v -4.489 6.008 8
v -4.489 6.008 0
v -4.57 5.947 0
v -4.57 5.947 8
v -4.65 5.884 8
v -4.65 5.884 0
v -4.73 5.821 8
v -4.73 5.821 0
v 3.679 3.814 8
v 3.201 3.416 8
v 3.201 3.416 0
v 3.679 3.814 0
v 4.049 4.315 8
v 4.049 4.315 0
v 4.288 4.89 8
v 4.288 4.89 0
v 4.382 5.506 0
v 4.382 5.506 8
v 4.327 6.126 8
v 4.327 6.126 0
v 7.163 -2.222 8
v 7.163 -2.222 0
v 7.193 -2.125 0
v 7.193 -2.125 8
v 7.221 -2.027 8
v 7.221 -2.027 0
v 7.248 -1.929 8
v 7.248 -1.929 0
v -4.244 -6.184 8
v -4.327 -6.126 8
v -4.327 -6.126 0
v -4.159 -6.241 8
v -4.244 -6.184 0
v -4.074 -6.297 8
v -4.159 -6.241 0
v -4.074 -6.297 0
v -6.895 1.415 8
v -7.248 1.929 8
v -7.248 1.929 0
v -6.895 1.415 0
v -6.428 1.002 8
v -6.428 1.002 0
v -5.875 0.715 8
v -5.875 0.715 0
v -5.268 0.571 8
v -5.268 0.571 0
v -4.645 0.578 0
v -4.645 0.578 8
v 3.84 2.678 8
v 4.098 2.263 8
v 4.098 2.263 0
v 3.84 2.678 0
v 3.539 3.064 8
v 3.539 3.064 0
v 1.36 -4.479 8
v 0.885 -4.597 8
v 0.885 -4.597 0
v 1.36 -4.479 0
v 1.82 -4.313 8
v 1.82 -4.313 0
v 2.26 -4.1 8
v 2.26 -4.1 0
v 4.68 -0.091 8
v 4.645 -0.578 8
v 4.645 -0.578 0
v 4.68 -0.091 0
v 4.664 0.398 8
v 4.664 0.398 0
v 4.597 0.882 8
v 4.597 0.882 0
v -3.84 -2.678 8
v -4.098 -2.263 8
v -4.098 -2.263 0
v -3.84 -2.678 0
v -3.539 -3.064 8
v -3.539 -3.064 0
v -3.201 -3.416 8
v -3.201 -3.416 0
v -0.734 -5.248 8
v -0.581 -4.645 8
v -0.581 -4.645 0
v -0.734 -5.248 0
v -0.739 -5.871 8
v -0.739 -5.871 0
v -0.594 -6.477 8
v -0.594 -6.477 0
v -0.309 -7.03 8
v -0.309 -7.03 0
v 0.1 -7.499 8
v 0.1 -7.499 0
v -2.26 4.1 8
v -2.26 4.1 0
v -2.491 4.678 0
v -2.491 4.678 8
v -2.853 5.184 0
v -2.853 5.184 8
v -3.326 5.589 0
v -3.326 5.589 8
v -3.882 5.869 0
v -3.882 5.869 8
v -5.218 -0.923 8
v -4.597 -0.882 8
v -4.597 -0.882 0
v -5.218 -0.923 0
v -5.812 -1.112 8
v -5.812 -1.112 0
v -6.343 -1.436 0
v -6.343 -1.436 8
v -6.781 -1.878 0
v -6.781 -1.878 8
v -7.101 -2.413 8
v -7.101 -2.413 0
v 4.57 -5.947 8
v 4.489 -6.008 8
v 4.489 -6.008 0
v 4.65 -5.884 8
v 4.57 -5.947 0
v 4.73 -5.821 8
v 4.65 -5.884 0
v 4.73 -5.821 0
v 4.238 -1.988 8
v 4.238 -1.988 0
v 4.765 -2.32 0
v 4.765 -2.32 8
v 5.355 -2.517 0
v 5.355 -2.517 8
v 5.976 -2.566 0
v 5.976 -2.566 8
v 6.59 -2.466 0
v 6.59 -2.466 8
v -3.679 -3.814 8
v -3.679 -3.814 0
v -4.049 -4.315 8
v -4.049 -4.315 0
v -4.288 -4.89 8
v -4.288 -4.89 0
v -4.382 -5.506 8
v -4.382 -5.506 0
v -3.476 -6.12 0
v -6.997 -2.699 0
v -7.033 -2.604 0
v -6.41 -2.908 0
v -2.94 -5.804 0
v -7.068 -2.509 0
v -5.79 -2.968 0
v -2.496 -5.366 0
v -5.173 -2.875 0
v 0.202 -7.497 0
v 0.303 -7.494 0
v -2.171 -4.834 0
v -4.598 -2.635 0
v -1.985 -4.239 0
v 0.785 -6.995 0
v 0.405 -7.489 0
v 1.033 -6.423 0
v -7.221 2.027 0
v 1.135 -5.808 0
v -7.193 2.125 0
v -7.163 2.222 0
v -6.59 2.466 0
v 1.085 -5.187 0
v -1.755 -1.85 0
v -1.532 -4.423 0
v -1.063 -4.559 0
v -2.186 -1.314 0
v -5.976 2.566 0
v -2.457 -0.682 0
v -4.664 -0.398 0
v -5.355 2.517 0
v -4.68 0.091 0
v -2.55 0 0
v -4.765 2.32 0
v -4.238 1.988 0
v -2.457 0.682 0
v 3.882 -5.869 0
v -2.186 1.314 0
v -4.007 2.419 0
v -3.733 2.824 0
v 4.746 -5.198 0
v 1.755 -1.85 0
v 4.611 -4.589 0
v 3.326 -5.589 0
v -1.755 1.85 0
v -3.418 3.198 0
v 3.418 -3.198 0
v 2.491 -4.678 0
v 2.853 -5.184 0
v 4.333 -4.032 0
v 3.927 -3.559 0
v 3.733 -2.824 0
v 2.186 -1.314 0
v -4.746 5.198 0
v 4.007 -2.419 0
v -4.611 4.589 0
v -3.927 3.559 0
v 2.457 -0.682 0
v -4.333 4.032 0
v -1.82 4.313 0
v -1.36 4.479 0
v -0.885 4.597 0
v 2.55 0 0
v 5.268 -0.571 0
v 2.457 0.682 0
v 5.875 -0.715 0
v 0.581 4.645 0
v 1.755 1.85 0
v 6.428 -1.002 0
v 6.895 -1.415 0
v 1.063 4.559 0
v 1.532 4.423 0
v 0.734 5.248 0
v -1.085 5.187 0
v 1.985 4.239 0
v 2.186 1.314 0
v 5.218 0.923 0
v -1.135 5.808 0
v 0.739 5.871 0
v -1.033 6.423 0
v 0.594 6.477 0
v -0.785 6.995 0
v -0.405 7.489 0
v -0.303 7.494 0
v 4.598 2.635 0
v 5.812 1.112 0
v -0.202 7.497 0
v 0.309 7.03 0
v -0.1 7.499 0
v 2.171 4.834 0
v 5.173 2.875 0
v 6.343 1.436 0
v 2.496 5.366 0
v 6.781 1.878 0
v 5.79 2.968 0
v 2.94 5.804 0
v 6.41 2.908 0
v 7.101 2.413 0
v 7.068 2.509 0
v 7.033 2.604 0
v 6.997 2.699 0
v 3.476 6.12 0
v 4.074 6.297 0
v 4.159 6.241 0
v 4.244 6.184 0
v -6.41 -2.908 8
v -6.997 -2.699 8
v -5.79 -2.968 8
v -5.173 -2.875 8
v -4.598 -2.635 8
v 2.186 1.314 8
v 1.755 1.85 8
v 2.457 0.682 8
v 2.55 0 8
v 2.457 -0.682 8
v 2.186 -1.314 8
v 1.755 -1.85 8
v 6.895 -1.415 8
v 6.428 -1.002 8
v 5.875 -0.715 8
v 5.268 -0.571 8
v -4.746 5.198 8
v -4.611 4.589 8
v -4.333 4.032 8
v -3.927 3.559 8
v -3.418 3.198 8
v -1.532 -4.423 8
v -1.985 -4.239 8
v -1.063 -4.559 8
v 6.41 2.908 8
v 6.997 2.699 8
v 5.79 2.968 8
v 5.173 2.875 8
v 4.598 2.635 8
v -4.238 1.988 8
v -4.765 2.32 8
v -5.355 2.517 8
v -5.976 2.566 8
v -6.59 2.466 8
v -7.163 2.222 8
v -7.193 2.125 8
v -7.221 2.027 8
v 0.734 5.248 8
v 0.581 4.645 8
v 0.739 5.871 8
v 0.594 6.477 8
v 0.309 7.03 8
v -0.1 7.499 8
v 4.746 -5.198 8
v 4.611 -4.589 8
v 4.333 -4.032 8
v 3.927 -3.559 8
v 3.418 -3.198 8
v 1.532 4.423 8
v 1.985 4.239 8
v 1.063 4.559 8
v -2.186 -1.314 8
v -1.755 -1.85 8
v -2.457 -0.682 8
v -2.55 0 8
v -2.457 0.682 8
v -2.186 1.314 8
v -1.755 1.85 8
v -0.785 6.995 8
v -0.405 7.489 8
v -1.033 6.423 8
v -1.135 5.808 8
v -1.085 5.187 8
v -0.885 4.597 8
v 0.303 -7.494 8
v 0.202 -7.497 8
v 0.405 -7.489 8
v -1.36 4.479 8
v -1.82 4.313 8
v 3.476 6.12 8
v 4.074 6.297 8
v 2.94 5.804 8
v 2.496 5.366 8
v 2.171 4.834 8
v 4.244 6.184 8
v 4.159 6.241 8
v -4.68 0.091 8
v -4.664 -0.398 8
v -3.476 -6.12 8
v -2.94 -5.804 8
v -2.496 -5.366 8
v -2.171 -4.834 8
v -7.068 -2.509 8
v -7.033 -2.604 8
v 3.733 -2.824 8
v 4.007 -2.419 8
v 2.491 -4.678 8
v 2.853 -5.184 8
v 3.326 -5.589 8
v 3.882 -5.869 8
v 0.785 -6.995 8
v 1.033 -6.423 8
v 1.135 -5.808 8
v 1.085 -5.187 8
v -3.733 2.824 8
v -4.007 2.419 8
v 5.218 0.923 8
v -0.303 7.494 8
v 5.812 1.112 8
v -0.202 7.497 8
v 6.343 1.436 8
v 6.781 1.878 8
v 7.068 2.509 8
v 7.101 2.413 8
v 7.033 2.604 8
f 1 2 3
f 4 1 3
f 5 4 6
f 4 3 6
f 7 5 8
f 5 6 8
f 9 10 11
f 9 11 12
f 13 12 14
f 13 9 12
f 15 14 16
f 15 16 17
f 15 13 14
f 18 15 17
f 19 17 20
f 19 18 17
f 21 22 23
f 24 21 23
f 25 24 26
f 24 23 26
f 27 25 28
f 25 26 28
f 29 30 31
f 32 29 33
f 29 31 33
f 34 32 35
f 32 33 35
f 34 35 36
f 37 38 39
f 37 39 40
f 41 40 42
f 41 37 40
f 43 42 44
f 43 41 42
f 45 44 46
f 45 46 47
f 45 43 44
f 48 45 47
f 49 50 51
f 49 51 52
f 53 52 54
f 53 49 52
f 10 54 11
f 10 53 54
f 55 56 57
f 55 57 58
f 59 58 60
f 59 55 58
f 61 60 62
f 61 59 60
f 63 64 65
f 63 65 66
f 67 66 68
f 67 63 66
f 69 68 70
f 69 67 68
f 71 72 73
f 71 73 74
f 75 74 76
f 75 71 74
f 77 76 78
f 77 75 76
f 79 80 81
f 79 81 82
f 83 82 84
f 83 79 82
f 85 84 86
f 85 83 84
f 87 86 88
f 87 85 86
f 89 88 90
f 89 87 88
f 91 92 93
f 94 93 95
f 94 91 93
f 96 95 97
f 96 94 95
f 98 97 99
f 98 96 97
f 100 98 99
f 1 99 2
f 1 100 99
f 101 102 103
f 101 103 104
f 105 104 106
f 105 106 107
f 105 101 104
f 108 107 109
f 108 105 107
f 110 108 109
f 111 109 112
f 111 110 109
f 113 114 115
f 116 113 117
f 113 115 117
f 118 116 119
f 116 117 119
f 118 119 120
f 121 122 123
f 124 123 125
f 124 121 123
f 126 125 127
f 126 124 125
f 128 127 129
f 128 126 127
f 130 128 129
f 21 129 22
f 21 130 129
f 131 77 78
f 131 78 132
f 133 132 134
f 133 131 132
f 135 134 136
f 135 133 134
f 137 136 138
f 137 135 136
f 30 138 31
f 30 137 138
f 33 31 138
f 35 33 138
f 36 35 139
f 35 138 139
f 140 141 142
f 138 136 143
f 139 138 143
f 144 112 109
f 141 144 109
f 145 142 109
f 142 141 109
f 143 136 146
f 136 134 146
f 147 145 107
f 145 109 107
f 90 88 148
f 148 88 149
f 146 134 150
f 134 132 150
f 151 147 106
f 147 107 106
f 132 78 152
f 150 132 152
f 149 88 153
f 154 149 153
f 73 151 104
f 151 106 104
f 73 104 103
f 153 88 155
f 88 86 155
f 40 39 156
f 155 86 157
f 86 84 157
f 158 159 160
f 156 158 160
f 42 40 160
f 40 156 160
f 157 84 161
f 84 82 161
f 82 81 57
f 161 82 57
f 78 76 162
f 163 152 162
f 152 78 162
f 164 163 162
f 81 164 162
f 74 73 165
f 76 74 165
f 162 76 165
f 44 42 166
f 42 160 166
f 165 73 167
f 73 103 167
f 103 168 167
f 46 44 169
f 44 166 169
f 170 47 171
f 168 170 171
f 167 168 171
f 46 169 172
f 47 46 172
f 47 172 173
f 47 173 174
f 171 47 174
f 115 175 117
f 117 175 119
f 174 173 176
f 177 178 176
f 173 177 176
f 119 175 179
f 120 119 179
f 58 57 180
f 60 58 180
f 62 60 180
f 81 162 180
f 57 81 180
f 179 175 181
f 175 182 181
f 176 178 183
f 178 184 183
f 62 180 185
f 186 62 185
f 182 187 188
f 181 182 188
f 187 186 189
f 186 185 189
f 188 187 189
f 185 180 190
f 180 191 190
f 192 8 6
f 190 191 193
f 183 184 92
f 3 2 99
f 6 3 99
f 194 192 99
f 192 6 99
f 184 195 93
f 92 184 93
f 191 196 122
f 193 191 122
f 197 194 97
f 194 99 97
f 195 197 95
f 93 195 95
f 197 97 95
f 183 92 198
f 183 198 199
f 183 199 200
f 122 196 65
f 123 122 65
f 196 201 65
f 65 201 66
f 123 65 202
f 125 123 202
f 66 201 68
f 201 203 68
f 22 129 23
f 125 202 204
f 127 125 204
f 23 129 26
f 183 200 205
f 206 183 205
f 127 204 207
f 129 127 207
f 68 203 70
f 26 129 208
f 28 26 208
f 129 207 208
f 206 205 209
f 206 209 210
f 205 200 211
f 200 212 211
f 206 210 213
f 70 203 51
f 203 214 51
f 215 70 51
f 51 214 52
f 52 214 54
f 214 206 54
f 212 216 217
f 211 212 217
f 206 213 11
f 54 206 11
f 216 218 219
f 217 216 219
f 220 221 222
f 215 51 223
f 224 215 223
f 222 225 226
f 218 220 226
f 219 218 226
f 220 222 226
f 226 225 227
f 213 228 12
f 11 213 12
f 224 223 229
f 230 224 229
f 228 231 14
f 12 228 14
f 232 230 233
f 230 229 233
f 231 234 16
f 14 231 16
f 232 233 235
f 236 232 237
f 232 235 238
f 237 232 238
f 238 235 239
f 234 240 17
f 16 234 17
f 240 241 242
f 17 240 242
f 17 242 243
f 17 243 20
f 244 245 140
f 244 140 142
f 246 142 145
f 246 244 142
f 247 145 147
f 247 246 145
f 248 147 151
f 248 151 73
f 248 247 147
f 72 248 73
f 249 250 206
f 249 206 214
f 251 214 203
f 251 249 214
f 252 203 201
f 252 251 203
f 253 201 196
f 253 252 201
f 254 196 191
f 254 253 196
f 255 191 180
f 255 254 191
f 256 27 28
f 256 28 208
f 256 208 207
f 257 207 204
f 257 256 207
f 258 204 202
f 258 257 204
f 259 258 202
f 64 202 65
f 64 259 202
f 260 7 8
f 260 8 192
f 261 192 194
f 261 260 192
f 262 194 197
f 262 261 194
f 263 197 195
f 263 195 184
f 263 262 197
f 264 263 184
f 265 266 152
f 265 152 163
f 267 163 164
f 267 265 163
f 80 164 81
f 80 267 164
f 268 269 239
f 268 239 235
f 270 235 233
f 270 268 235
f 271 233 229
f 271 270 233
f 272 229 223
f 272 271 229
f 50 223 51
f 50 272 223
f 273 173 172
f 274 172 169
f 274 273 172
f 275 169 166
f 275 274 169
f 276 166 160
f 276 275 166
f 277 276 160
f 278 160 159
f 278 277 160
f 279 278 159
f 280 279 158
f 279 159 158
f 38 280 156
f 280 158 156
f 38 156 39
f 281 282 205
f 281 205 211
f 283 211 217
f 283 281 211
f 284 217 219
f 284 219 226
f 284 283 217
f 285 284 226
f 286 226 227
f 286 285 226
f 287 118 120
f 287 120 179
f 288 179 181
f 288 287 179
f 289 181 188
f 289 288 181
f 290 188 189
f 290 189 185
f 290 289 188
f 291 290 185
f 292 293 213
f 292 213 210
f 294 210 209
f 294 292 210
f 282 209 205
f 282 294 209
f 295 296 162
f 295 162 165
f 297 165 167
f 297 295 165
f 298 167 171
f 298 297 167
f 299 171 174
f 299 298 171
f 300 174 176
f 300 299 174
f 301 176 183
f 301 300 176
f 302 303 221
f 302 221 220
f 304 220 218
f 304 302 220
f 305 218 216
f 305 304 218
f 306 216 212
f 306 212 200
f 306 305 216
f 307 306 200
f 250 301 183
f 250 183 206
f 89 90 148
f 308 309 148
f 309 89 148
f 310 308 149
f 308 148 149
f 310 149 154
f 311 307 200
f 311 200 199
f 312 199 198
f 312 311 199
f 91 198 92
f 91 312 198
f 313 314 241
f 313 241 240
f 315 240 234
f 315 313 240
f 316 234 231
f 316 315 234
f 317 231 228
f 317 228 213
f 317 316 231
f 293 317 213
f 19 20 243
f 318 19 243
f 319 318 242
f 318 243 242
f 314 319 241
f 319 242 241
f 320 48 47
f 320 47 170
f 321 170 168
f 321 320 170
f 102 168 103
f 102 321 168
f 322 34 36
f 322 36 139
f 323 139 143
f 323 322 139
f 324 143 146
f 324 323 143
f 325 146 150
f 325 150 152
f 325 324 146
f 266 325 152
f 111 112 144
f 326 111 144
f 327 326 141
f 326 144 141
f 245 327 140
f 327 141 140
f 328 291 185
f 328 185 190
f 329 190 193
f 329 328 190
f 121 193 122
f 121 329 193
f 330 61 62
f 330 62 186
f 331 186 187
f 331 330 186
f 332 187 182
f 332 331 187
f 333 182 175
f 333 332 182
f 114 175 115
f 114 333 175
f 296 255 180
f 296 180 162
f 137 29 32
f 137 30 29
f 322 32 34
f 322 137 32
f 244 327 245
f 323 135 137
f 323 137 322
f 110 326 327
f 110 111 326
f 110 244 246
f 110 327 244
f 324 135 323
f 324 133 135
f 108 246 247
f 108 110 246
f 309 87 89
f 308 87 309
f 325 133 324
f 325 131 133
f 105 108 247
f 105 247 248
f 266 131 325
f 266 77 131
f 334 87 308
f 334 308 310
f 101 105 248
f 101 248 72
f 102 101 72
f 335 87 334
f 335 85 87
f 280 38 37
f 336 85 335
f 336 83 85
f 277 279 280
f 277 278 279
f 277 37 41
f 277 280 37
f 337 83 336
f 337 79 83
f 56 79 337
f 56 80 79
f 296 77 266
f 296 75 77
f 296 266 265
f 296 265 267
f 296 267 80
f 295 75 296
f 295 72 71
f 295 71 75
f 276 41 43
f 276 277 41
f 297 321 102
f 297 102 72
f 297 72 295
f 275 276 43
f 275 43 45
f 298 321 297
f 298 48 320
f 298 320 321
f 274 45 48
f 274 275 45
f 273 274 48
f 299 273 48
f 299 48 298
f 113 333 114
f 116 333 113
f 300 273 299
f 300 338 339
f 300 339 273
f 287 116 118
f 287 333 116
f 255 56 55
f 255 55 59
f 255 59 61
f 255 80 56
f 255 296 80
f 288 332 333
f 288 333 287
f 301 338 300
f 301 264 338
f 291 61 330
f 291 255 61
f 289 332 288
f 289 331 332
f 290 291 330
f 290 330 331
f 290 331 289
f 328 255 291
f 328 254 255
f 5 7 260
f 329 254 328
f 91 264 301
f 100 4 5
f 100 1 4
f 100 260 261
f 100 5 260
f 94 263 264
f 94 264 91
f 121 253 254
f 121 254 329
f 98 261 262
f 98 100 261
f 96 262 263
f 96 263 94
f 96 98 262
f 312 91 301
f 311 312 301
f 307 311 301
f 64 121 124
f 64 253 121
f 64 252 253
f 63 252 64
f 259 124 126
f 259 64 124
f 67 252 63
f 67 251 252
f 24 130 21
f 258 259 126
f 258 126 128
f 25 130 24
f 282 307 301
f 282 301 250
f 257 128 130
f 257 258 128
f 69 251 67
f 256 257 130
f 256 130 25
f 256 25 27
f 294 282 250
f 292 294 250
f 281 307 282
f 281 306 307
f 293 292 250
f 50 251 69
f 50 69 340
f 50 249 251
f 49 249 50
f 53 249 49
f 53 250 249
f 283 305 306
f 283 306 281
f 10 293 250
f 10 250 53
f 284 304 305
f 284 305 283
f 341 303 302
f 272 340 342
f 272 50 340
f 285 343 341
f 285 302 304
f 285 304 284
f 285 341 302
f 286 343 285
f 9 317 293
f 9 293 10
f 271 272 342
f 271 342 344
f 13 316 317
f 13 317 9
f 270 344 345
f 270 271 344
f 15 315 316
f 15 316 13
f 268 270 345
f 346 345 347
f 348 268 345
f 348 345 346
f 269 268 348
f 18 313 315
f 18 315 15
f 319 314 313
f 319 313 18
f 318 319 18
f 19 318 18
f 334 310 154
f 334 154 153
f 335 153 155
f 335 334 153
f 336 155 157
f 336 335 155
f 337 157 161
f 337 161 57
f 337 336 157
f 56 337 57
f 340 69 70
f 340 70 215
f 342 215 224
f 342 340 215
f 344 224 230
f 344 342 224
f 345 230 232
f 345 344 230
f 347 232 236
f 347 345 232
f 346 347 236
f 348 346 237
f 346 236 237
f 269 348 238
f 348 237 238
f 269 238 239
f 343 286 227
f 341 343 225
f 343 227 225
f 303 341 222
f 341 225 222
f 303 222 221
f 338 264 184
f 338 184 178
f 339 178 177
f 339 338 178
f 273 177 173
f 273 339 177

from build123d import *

# Parameters (mm, degrees)
SKIZZE1_R                       = 7.5
AUFSATZ_LINEAR_AUSTRAGEN1_DEPTH = 8
SCHNITT_LINEAR_AUSTRAGEN1_DEPTH = 14.285330256
KREISMUSTER1_COUNT              = 10
SCHNITT_LINEAR_AUSTRAGEN3_REACH = 15.144


with BuildPart() as part:
    # Skizze1 → Aufsatz-Linear austragen1 (new body)
    with BuildSketch(Plane.XY):
        Circle(SKIZZE1_R)
    extrude(amount=AUFSATZ_LINEAR_AUSTRAGEN1_DEPTH)

    # Skizze3 → Schnitt-Linear austragen1 (cut, through all)
    with BuildSketch(Plane.XY.offset(8)):
        with BuildLine():
            ThreePointArc((1.98549644, 4.239169305), (1.299374701, 4.497152198), (0.581391256, 4.644861324))
            ThreePointArc((0.581391256, 4.644861324), (0.684746364, 6.178122942), (-0.100097626, 7.499332001))
            ThreePointArc((-0.100097626, 7.499332001), (2.076040858, 7.20694487), (4.074246256, 6.296865684))
            ThreePointArc((4.074246256, 6.296865684), (2.704090414, 5.598714906), (1.98549644, 4.239169305))
        make_face()
    schnitt_linear_austragen1 = extrude(amount=-SCHNITT_LINEAR_AUSTRAGEN1_DEPTH, mode=Mode.SUBTRACT)

    # Kreismuster1: Schnitt-Linear austragen1 ×10 about axis
    kreismuster1_axis = Axis((0, 0, 8), (0, 0, -1))
    for i in range(1, KREISMUSTER1_COUNT):
        add(schnitt_linear_austragen1.rotate(kreismuster1_axis, i * 360 / KREISMUSTER1_COUNT), mode=Mode.SUBTRACT)

    # Skizze4 → Schnitt-Linear austragen3 (cut, up to next)
    with BuildSketch(Plane.XY.offset(8), mode=Mode.PRIVATE) as schnitt_linear_austragen3_sk1:
        with BuildLine():
            Line((1.754992877, -1.85), (-1.754992877, -1.85))
            ThreePointArc((-1.754992877, -1.85), (-2.55, 0), (-1.754992877, 1.85))
            Line((-1.754992877, 1.85), (1.754992877, 1.85))
            ThreePointArc((1.754992877, 1.85), (2.55, 0), (1.754992877, -1.85))
        make_face()
    schnitt_linear_austragen3_tool1 = extrude(schnitt_linear_austragen3_sk1.sketch, amount=-SCHNITT_LINEAR_AUSTRAGEN3_REACH, mode=Mode.PRIVATE) & part.part
    add(schnitt_linear_austragen3_tool1.solids().sort_by_distance((0, 0, 8))[0], mode=Mode.SUBTRACT)


solid = part.part
